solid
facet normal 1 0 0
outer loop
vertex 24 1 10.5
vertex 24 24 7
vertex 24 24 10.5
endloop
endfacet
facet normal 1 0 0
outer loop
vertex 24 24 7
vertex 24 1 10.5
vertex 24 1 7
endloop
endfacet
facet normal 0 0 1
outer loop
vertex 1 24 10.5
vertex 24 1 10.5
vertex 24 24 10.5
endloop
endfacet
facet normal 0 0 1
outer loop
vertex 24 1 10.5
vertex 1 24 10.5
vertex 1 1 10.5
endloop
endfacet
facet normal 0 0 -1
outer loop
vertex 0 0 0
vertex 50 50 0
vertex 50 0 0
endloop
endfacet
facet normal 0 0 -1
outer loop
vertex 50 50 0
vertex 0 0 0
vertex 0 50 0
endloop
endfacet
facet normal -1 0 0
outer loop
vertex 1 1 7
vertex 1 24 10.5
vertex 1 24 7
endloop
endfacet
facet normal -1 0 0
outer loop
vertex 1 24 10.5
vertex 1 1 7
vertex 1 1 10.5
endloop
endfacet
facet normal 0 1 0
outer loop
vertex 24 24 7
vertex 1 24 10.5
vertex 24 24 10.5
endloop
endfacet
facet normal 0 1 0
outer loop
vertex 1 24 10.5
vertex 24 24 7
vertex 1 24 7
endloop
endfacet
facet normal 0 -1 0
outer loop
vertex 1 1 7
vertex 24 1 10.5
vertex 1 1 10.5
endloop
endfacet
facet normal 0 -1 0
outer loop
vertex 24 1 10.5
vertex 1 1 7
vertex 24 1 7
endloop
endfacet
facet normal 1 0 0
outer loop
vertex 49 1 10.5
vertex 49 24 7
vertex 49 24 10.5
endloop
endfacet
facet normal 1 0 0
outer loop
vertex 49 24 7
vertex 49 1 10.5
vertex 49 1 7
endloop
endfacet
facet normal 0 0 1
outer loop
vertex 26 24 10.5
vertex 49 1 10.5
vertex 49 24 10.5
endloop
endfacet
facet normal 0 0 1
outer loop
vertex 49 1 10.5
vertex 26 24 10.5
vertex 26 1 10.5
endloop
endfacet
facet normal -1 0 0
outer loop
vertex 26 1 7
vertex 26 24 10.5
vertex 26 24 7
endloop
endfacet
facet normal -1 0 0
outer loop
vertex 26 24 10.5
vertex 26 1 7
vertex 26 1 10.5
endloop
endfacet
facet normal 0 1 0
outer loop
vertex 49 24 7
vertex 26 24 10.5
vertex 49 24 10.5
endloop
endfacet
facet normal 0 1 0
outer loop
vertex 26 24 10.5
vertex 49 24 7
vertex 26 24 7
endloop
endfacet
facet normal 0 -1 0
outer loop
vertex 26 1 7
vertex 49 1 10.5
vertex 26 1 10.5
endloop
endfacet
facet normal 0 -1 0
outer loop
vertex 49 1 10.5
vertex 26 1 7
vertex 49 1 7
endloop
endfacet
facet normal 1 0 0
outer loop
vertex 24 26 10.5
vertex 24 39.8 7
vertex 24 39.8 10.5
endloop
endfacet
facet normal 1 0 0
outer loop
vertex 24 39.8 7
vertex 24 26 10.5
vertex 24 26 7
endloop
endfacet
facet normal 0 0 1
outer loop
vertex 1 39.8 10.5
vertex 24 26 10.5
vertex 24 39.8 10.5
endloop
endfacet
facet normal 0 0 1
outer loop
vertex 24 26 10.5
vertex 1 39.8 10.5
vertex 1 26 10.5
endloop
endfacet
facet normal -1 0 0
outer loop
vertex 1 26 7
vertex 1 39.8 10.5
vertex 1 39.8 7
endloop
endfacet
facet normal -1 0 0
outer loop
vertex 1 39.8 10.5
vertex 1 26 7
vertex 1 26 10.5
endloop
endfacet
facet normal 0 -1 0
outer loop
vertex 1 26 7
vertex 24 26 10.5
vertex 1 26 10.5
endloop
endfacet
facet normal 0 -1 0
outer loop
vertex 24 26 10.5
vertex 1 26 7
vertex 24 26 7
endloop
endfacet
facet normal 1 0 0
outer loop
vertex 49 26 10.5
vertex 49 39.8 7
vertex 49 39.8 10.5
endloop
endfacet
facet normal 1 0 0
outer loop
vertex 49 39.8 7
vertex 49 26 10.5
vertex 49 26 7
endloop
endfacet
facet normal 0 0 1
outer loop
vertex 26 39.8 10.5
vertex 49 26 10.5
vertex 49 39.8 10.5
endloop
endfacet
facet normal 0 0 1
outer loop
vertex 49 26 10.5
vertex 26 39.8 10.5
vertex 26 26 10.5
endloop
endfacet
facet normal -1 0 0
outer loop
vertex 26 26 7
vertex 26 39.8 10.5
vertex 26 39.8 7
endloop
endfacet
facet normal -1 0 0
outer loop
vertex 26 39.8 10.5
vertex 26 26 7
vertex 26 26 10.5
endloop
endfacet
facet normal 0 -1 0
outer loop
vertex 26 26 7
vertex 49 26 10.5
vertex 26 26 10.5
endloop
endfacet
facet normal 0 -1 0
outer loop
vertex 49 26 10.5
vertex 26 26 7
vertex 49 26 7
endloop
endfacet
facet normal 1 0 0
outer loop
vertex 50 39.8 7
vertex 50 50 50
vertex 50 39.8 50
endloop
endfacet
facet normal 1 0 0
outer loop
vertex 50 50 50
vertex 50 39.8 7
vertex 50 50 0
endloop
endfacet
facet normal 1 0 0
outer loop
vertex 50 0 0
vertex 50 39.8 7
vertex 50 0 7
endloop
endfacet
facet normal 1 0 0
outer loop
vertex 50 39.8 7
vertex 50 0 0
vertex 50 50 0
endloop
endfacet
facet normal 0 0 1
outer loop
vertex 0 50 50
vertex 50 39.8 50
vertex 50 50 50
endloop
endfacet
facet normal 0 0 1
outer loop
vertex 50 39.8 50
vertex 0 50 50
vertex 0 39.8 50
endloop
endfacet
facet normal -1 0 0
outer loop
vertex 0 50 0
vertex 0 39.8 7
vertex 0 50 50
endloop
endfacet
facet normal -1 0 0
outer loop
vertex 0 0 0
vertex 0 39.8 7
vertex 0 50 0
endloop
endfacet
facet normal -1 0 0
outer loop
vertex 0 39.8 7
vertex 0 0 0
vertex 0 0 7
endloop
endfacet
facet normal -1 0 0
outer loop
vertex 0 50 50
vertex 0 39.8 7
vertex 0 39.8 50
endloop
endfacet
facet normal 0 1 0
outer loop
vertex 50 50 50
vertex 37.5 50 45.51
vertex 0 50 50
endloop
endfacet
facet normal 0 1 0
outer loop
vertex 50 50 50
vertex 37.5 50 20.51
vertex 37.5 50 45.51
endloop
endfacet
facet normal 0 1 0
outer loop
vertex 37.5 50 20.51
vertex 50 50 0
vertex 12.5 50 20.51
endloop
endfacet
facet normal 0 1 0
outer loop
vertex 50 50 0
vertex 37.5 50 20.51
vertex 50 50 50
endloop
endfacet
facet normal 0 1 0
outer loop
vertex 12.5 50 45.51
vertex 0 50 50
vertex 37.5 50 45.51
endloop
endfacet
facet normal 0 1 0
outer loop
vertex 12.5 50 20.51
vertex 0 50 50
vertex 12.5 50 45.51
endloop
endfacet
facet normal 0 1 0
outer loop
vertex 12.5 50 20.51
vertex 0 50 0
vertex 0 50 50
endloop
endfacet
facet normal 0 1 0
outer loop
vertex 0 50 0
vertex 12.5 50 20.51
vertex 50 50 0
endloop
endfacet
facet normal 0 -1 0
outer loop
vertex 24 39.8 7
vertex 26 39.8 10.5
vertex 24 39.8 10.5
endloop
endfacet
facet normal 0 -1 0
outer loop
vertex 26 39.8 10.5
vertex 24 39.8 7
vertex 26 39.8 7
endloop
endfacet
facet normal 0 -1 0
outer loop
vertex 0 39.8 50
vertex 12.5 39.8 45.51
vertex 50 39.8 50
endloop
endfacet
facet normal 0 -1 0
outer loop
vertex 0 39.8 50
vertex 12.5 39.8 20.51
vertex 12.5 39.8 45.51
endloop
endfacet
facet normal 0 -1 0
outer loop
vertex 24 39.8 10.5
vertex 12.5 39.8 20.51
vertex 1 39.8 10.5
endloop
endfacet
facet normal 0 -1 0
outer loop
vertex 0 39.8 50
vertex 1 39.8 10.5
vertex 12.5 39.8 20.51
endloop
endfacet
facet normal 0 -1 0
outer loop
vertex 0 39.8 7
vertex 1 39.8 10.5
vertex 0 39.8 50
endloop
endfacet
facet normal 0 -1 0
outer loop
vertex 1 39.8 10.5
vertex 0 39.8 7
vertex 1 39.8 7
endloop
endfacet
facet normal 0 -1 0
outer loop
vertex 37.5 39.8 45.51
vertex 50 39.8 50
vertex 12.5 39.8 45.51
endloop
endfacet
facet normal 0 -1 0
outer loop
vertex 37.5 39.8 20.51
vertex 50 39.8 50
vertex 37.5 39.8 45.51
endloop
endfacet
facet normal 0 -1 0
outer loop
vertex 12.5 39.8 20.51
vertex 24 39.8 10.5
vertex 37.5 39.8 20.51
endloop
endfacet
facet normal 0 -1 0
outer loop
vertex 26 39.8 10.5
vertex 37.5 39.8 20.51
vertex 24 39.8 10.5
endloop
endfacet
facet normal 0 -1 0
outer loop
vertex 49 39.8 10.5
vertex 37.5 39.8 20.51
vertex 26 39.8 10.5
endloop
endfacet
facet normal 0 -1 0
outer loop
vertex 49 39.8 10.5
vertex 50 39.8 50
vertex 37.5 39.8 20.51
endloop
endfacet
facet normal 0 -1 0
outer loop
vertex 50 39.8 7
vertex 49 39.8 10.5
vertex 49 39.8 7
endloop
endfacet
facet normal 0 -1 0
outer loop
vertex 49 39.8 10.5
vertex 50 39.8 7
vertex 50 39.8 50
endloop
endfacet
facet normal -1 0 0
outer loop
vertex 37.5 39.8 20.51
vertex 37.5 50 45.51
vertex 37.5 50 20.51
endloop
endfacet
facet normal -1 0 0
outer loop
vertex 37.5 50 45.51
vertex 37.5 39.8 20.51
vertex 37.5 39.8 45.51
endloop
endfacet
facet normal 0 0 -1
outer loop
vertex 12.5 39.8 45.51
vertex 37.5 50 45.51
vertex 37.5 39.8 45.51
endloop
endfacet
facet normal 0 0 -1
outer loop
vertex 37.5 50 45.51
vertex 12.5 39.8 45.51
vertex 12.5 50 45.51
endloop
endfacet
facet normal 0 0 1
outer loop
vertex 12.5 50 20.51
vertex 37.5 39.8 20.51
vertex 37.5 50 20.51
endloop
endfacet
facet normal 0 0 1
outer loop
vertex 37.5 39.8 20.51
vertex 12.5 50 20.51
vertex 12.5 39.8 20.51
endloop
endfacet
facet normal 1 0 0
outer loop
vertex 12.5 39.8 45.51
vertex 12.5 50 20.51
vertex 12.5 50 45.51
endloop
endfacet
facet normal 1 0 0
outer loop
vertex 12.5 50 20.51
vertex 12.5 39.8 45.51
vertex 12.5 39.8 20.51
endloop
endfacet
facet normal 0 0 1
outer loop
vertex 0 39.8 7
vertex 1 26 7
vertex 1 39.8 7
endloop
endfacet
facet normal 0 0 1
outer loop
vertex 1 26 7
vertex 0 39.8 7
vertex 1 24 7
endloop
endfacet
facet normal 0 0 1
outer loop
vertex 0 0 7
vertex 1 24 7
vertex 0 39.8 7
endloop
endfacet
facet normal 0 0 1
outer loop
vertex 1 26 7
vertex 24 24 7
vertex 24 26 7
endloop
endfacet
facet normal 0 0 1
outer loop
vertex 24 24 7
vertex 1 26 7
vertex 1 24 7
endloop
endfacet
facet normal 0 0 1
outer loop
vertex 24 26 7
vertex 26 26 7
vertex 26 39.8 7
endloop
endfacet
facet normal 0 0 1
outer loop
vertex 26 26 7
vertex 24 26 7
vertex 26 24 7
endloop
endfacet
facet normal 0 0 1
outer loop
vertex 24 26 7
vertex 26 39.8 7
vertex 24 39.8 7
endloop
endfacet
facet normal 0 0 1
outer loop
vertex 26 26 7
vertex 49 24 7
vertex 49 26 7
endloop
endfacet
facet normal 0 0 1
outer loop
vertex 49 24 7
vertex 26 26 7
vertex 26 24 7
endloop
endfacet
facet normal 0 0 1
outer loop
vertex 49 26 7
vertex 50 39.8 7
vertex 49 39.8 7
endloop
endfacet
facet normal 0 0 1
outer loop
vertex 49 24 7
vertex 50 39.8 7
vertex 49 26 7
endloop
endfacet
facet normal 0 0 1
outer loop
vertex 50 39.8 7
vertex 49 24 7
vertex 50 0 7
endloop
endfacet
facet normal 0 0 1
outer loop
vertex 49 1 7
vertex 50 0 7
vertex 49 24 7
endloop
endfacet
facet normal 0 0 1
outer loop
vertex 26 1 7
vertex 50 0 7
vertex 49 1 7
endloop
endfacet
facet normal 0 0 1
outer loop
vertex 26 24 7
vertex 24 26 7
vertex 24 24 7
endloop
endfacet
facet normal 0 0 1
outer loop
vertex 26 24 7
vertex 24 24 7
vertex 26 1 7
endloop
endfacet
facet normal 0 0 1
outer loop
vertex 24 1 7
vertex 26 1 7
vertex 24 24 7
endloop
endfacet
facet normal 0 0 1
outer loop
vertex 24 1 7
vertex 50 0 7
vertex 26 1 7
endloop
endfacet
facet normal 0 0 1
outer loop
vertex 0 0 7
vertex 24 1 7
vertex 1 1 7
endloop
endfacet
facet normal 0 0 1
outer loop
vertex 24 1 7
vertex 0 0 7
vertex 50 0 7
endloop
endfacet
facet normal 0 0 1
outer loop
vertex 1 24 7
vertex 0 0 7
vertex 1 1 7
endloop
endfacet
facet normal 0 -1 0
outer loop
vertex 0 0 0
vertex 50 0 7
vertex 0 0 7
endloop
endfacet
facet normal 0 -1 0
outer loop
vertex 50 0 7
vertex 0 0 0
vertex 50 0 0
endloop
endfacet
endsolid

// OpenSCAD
color("LightGray") {
    translate([1,1,0]) cube([23,23,6+4.5]);
    translate([25+1,1,0]) cube([23,23,6+4.5]);
    translate([1,25+1,0]) cube([23,23,6+4.5]);
    translate([25+1,25+1,0]) cube([23,23,6+4.5]);
}
color("Grey") {
    cube([50,50,7]);
    difference() {
        translate([0,50-10.2,0]) cube([50,10.2,50]);
        translate([12.5,25,6+4.51+10]) cube([25,50,25]);
    }
}
